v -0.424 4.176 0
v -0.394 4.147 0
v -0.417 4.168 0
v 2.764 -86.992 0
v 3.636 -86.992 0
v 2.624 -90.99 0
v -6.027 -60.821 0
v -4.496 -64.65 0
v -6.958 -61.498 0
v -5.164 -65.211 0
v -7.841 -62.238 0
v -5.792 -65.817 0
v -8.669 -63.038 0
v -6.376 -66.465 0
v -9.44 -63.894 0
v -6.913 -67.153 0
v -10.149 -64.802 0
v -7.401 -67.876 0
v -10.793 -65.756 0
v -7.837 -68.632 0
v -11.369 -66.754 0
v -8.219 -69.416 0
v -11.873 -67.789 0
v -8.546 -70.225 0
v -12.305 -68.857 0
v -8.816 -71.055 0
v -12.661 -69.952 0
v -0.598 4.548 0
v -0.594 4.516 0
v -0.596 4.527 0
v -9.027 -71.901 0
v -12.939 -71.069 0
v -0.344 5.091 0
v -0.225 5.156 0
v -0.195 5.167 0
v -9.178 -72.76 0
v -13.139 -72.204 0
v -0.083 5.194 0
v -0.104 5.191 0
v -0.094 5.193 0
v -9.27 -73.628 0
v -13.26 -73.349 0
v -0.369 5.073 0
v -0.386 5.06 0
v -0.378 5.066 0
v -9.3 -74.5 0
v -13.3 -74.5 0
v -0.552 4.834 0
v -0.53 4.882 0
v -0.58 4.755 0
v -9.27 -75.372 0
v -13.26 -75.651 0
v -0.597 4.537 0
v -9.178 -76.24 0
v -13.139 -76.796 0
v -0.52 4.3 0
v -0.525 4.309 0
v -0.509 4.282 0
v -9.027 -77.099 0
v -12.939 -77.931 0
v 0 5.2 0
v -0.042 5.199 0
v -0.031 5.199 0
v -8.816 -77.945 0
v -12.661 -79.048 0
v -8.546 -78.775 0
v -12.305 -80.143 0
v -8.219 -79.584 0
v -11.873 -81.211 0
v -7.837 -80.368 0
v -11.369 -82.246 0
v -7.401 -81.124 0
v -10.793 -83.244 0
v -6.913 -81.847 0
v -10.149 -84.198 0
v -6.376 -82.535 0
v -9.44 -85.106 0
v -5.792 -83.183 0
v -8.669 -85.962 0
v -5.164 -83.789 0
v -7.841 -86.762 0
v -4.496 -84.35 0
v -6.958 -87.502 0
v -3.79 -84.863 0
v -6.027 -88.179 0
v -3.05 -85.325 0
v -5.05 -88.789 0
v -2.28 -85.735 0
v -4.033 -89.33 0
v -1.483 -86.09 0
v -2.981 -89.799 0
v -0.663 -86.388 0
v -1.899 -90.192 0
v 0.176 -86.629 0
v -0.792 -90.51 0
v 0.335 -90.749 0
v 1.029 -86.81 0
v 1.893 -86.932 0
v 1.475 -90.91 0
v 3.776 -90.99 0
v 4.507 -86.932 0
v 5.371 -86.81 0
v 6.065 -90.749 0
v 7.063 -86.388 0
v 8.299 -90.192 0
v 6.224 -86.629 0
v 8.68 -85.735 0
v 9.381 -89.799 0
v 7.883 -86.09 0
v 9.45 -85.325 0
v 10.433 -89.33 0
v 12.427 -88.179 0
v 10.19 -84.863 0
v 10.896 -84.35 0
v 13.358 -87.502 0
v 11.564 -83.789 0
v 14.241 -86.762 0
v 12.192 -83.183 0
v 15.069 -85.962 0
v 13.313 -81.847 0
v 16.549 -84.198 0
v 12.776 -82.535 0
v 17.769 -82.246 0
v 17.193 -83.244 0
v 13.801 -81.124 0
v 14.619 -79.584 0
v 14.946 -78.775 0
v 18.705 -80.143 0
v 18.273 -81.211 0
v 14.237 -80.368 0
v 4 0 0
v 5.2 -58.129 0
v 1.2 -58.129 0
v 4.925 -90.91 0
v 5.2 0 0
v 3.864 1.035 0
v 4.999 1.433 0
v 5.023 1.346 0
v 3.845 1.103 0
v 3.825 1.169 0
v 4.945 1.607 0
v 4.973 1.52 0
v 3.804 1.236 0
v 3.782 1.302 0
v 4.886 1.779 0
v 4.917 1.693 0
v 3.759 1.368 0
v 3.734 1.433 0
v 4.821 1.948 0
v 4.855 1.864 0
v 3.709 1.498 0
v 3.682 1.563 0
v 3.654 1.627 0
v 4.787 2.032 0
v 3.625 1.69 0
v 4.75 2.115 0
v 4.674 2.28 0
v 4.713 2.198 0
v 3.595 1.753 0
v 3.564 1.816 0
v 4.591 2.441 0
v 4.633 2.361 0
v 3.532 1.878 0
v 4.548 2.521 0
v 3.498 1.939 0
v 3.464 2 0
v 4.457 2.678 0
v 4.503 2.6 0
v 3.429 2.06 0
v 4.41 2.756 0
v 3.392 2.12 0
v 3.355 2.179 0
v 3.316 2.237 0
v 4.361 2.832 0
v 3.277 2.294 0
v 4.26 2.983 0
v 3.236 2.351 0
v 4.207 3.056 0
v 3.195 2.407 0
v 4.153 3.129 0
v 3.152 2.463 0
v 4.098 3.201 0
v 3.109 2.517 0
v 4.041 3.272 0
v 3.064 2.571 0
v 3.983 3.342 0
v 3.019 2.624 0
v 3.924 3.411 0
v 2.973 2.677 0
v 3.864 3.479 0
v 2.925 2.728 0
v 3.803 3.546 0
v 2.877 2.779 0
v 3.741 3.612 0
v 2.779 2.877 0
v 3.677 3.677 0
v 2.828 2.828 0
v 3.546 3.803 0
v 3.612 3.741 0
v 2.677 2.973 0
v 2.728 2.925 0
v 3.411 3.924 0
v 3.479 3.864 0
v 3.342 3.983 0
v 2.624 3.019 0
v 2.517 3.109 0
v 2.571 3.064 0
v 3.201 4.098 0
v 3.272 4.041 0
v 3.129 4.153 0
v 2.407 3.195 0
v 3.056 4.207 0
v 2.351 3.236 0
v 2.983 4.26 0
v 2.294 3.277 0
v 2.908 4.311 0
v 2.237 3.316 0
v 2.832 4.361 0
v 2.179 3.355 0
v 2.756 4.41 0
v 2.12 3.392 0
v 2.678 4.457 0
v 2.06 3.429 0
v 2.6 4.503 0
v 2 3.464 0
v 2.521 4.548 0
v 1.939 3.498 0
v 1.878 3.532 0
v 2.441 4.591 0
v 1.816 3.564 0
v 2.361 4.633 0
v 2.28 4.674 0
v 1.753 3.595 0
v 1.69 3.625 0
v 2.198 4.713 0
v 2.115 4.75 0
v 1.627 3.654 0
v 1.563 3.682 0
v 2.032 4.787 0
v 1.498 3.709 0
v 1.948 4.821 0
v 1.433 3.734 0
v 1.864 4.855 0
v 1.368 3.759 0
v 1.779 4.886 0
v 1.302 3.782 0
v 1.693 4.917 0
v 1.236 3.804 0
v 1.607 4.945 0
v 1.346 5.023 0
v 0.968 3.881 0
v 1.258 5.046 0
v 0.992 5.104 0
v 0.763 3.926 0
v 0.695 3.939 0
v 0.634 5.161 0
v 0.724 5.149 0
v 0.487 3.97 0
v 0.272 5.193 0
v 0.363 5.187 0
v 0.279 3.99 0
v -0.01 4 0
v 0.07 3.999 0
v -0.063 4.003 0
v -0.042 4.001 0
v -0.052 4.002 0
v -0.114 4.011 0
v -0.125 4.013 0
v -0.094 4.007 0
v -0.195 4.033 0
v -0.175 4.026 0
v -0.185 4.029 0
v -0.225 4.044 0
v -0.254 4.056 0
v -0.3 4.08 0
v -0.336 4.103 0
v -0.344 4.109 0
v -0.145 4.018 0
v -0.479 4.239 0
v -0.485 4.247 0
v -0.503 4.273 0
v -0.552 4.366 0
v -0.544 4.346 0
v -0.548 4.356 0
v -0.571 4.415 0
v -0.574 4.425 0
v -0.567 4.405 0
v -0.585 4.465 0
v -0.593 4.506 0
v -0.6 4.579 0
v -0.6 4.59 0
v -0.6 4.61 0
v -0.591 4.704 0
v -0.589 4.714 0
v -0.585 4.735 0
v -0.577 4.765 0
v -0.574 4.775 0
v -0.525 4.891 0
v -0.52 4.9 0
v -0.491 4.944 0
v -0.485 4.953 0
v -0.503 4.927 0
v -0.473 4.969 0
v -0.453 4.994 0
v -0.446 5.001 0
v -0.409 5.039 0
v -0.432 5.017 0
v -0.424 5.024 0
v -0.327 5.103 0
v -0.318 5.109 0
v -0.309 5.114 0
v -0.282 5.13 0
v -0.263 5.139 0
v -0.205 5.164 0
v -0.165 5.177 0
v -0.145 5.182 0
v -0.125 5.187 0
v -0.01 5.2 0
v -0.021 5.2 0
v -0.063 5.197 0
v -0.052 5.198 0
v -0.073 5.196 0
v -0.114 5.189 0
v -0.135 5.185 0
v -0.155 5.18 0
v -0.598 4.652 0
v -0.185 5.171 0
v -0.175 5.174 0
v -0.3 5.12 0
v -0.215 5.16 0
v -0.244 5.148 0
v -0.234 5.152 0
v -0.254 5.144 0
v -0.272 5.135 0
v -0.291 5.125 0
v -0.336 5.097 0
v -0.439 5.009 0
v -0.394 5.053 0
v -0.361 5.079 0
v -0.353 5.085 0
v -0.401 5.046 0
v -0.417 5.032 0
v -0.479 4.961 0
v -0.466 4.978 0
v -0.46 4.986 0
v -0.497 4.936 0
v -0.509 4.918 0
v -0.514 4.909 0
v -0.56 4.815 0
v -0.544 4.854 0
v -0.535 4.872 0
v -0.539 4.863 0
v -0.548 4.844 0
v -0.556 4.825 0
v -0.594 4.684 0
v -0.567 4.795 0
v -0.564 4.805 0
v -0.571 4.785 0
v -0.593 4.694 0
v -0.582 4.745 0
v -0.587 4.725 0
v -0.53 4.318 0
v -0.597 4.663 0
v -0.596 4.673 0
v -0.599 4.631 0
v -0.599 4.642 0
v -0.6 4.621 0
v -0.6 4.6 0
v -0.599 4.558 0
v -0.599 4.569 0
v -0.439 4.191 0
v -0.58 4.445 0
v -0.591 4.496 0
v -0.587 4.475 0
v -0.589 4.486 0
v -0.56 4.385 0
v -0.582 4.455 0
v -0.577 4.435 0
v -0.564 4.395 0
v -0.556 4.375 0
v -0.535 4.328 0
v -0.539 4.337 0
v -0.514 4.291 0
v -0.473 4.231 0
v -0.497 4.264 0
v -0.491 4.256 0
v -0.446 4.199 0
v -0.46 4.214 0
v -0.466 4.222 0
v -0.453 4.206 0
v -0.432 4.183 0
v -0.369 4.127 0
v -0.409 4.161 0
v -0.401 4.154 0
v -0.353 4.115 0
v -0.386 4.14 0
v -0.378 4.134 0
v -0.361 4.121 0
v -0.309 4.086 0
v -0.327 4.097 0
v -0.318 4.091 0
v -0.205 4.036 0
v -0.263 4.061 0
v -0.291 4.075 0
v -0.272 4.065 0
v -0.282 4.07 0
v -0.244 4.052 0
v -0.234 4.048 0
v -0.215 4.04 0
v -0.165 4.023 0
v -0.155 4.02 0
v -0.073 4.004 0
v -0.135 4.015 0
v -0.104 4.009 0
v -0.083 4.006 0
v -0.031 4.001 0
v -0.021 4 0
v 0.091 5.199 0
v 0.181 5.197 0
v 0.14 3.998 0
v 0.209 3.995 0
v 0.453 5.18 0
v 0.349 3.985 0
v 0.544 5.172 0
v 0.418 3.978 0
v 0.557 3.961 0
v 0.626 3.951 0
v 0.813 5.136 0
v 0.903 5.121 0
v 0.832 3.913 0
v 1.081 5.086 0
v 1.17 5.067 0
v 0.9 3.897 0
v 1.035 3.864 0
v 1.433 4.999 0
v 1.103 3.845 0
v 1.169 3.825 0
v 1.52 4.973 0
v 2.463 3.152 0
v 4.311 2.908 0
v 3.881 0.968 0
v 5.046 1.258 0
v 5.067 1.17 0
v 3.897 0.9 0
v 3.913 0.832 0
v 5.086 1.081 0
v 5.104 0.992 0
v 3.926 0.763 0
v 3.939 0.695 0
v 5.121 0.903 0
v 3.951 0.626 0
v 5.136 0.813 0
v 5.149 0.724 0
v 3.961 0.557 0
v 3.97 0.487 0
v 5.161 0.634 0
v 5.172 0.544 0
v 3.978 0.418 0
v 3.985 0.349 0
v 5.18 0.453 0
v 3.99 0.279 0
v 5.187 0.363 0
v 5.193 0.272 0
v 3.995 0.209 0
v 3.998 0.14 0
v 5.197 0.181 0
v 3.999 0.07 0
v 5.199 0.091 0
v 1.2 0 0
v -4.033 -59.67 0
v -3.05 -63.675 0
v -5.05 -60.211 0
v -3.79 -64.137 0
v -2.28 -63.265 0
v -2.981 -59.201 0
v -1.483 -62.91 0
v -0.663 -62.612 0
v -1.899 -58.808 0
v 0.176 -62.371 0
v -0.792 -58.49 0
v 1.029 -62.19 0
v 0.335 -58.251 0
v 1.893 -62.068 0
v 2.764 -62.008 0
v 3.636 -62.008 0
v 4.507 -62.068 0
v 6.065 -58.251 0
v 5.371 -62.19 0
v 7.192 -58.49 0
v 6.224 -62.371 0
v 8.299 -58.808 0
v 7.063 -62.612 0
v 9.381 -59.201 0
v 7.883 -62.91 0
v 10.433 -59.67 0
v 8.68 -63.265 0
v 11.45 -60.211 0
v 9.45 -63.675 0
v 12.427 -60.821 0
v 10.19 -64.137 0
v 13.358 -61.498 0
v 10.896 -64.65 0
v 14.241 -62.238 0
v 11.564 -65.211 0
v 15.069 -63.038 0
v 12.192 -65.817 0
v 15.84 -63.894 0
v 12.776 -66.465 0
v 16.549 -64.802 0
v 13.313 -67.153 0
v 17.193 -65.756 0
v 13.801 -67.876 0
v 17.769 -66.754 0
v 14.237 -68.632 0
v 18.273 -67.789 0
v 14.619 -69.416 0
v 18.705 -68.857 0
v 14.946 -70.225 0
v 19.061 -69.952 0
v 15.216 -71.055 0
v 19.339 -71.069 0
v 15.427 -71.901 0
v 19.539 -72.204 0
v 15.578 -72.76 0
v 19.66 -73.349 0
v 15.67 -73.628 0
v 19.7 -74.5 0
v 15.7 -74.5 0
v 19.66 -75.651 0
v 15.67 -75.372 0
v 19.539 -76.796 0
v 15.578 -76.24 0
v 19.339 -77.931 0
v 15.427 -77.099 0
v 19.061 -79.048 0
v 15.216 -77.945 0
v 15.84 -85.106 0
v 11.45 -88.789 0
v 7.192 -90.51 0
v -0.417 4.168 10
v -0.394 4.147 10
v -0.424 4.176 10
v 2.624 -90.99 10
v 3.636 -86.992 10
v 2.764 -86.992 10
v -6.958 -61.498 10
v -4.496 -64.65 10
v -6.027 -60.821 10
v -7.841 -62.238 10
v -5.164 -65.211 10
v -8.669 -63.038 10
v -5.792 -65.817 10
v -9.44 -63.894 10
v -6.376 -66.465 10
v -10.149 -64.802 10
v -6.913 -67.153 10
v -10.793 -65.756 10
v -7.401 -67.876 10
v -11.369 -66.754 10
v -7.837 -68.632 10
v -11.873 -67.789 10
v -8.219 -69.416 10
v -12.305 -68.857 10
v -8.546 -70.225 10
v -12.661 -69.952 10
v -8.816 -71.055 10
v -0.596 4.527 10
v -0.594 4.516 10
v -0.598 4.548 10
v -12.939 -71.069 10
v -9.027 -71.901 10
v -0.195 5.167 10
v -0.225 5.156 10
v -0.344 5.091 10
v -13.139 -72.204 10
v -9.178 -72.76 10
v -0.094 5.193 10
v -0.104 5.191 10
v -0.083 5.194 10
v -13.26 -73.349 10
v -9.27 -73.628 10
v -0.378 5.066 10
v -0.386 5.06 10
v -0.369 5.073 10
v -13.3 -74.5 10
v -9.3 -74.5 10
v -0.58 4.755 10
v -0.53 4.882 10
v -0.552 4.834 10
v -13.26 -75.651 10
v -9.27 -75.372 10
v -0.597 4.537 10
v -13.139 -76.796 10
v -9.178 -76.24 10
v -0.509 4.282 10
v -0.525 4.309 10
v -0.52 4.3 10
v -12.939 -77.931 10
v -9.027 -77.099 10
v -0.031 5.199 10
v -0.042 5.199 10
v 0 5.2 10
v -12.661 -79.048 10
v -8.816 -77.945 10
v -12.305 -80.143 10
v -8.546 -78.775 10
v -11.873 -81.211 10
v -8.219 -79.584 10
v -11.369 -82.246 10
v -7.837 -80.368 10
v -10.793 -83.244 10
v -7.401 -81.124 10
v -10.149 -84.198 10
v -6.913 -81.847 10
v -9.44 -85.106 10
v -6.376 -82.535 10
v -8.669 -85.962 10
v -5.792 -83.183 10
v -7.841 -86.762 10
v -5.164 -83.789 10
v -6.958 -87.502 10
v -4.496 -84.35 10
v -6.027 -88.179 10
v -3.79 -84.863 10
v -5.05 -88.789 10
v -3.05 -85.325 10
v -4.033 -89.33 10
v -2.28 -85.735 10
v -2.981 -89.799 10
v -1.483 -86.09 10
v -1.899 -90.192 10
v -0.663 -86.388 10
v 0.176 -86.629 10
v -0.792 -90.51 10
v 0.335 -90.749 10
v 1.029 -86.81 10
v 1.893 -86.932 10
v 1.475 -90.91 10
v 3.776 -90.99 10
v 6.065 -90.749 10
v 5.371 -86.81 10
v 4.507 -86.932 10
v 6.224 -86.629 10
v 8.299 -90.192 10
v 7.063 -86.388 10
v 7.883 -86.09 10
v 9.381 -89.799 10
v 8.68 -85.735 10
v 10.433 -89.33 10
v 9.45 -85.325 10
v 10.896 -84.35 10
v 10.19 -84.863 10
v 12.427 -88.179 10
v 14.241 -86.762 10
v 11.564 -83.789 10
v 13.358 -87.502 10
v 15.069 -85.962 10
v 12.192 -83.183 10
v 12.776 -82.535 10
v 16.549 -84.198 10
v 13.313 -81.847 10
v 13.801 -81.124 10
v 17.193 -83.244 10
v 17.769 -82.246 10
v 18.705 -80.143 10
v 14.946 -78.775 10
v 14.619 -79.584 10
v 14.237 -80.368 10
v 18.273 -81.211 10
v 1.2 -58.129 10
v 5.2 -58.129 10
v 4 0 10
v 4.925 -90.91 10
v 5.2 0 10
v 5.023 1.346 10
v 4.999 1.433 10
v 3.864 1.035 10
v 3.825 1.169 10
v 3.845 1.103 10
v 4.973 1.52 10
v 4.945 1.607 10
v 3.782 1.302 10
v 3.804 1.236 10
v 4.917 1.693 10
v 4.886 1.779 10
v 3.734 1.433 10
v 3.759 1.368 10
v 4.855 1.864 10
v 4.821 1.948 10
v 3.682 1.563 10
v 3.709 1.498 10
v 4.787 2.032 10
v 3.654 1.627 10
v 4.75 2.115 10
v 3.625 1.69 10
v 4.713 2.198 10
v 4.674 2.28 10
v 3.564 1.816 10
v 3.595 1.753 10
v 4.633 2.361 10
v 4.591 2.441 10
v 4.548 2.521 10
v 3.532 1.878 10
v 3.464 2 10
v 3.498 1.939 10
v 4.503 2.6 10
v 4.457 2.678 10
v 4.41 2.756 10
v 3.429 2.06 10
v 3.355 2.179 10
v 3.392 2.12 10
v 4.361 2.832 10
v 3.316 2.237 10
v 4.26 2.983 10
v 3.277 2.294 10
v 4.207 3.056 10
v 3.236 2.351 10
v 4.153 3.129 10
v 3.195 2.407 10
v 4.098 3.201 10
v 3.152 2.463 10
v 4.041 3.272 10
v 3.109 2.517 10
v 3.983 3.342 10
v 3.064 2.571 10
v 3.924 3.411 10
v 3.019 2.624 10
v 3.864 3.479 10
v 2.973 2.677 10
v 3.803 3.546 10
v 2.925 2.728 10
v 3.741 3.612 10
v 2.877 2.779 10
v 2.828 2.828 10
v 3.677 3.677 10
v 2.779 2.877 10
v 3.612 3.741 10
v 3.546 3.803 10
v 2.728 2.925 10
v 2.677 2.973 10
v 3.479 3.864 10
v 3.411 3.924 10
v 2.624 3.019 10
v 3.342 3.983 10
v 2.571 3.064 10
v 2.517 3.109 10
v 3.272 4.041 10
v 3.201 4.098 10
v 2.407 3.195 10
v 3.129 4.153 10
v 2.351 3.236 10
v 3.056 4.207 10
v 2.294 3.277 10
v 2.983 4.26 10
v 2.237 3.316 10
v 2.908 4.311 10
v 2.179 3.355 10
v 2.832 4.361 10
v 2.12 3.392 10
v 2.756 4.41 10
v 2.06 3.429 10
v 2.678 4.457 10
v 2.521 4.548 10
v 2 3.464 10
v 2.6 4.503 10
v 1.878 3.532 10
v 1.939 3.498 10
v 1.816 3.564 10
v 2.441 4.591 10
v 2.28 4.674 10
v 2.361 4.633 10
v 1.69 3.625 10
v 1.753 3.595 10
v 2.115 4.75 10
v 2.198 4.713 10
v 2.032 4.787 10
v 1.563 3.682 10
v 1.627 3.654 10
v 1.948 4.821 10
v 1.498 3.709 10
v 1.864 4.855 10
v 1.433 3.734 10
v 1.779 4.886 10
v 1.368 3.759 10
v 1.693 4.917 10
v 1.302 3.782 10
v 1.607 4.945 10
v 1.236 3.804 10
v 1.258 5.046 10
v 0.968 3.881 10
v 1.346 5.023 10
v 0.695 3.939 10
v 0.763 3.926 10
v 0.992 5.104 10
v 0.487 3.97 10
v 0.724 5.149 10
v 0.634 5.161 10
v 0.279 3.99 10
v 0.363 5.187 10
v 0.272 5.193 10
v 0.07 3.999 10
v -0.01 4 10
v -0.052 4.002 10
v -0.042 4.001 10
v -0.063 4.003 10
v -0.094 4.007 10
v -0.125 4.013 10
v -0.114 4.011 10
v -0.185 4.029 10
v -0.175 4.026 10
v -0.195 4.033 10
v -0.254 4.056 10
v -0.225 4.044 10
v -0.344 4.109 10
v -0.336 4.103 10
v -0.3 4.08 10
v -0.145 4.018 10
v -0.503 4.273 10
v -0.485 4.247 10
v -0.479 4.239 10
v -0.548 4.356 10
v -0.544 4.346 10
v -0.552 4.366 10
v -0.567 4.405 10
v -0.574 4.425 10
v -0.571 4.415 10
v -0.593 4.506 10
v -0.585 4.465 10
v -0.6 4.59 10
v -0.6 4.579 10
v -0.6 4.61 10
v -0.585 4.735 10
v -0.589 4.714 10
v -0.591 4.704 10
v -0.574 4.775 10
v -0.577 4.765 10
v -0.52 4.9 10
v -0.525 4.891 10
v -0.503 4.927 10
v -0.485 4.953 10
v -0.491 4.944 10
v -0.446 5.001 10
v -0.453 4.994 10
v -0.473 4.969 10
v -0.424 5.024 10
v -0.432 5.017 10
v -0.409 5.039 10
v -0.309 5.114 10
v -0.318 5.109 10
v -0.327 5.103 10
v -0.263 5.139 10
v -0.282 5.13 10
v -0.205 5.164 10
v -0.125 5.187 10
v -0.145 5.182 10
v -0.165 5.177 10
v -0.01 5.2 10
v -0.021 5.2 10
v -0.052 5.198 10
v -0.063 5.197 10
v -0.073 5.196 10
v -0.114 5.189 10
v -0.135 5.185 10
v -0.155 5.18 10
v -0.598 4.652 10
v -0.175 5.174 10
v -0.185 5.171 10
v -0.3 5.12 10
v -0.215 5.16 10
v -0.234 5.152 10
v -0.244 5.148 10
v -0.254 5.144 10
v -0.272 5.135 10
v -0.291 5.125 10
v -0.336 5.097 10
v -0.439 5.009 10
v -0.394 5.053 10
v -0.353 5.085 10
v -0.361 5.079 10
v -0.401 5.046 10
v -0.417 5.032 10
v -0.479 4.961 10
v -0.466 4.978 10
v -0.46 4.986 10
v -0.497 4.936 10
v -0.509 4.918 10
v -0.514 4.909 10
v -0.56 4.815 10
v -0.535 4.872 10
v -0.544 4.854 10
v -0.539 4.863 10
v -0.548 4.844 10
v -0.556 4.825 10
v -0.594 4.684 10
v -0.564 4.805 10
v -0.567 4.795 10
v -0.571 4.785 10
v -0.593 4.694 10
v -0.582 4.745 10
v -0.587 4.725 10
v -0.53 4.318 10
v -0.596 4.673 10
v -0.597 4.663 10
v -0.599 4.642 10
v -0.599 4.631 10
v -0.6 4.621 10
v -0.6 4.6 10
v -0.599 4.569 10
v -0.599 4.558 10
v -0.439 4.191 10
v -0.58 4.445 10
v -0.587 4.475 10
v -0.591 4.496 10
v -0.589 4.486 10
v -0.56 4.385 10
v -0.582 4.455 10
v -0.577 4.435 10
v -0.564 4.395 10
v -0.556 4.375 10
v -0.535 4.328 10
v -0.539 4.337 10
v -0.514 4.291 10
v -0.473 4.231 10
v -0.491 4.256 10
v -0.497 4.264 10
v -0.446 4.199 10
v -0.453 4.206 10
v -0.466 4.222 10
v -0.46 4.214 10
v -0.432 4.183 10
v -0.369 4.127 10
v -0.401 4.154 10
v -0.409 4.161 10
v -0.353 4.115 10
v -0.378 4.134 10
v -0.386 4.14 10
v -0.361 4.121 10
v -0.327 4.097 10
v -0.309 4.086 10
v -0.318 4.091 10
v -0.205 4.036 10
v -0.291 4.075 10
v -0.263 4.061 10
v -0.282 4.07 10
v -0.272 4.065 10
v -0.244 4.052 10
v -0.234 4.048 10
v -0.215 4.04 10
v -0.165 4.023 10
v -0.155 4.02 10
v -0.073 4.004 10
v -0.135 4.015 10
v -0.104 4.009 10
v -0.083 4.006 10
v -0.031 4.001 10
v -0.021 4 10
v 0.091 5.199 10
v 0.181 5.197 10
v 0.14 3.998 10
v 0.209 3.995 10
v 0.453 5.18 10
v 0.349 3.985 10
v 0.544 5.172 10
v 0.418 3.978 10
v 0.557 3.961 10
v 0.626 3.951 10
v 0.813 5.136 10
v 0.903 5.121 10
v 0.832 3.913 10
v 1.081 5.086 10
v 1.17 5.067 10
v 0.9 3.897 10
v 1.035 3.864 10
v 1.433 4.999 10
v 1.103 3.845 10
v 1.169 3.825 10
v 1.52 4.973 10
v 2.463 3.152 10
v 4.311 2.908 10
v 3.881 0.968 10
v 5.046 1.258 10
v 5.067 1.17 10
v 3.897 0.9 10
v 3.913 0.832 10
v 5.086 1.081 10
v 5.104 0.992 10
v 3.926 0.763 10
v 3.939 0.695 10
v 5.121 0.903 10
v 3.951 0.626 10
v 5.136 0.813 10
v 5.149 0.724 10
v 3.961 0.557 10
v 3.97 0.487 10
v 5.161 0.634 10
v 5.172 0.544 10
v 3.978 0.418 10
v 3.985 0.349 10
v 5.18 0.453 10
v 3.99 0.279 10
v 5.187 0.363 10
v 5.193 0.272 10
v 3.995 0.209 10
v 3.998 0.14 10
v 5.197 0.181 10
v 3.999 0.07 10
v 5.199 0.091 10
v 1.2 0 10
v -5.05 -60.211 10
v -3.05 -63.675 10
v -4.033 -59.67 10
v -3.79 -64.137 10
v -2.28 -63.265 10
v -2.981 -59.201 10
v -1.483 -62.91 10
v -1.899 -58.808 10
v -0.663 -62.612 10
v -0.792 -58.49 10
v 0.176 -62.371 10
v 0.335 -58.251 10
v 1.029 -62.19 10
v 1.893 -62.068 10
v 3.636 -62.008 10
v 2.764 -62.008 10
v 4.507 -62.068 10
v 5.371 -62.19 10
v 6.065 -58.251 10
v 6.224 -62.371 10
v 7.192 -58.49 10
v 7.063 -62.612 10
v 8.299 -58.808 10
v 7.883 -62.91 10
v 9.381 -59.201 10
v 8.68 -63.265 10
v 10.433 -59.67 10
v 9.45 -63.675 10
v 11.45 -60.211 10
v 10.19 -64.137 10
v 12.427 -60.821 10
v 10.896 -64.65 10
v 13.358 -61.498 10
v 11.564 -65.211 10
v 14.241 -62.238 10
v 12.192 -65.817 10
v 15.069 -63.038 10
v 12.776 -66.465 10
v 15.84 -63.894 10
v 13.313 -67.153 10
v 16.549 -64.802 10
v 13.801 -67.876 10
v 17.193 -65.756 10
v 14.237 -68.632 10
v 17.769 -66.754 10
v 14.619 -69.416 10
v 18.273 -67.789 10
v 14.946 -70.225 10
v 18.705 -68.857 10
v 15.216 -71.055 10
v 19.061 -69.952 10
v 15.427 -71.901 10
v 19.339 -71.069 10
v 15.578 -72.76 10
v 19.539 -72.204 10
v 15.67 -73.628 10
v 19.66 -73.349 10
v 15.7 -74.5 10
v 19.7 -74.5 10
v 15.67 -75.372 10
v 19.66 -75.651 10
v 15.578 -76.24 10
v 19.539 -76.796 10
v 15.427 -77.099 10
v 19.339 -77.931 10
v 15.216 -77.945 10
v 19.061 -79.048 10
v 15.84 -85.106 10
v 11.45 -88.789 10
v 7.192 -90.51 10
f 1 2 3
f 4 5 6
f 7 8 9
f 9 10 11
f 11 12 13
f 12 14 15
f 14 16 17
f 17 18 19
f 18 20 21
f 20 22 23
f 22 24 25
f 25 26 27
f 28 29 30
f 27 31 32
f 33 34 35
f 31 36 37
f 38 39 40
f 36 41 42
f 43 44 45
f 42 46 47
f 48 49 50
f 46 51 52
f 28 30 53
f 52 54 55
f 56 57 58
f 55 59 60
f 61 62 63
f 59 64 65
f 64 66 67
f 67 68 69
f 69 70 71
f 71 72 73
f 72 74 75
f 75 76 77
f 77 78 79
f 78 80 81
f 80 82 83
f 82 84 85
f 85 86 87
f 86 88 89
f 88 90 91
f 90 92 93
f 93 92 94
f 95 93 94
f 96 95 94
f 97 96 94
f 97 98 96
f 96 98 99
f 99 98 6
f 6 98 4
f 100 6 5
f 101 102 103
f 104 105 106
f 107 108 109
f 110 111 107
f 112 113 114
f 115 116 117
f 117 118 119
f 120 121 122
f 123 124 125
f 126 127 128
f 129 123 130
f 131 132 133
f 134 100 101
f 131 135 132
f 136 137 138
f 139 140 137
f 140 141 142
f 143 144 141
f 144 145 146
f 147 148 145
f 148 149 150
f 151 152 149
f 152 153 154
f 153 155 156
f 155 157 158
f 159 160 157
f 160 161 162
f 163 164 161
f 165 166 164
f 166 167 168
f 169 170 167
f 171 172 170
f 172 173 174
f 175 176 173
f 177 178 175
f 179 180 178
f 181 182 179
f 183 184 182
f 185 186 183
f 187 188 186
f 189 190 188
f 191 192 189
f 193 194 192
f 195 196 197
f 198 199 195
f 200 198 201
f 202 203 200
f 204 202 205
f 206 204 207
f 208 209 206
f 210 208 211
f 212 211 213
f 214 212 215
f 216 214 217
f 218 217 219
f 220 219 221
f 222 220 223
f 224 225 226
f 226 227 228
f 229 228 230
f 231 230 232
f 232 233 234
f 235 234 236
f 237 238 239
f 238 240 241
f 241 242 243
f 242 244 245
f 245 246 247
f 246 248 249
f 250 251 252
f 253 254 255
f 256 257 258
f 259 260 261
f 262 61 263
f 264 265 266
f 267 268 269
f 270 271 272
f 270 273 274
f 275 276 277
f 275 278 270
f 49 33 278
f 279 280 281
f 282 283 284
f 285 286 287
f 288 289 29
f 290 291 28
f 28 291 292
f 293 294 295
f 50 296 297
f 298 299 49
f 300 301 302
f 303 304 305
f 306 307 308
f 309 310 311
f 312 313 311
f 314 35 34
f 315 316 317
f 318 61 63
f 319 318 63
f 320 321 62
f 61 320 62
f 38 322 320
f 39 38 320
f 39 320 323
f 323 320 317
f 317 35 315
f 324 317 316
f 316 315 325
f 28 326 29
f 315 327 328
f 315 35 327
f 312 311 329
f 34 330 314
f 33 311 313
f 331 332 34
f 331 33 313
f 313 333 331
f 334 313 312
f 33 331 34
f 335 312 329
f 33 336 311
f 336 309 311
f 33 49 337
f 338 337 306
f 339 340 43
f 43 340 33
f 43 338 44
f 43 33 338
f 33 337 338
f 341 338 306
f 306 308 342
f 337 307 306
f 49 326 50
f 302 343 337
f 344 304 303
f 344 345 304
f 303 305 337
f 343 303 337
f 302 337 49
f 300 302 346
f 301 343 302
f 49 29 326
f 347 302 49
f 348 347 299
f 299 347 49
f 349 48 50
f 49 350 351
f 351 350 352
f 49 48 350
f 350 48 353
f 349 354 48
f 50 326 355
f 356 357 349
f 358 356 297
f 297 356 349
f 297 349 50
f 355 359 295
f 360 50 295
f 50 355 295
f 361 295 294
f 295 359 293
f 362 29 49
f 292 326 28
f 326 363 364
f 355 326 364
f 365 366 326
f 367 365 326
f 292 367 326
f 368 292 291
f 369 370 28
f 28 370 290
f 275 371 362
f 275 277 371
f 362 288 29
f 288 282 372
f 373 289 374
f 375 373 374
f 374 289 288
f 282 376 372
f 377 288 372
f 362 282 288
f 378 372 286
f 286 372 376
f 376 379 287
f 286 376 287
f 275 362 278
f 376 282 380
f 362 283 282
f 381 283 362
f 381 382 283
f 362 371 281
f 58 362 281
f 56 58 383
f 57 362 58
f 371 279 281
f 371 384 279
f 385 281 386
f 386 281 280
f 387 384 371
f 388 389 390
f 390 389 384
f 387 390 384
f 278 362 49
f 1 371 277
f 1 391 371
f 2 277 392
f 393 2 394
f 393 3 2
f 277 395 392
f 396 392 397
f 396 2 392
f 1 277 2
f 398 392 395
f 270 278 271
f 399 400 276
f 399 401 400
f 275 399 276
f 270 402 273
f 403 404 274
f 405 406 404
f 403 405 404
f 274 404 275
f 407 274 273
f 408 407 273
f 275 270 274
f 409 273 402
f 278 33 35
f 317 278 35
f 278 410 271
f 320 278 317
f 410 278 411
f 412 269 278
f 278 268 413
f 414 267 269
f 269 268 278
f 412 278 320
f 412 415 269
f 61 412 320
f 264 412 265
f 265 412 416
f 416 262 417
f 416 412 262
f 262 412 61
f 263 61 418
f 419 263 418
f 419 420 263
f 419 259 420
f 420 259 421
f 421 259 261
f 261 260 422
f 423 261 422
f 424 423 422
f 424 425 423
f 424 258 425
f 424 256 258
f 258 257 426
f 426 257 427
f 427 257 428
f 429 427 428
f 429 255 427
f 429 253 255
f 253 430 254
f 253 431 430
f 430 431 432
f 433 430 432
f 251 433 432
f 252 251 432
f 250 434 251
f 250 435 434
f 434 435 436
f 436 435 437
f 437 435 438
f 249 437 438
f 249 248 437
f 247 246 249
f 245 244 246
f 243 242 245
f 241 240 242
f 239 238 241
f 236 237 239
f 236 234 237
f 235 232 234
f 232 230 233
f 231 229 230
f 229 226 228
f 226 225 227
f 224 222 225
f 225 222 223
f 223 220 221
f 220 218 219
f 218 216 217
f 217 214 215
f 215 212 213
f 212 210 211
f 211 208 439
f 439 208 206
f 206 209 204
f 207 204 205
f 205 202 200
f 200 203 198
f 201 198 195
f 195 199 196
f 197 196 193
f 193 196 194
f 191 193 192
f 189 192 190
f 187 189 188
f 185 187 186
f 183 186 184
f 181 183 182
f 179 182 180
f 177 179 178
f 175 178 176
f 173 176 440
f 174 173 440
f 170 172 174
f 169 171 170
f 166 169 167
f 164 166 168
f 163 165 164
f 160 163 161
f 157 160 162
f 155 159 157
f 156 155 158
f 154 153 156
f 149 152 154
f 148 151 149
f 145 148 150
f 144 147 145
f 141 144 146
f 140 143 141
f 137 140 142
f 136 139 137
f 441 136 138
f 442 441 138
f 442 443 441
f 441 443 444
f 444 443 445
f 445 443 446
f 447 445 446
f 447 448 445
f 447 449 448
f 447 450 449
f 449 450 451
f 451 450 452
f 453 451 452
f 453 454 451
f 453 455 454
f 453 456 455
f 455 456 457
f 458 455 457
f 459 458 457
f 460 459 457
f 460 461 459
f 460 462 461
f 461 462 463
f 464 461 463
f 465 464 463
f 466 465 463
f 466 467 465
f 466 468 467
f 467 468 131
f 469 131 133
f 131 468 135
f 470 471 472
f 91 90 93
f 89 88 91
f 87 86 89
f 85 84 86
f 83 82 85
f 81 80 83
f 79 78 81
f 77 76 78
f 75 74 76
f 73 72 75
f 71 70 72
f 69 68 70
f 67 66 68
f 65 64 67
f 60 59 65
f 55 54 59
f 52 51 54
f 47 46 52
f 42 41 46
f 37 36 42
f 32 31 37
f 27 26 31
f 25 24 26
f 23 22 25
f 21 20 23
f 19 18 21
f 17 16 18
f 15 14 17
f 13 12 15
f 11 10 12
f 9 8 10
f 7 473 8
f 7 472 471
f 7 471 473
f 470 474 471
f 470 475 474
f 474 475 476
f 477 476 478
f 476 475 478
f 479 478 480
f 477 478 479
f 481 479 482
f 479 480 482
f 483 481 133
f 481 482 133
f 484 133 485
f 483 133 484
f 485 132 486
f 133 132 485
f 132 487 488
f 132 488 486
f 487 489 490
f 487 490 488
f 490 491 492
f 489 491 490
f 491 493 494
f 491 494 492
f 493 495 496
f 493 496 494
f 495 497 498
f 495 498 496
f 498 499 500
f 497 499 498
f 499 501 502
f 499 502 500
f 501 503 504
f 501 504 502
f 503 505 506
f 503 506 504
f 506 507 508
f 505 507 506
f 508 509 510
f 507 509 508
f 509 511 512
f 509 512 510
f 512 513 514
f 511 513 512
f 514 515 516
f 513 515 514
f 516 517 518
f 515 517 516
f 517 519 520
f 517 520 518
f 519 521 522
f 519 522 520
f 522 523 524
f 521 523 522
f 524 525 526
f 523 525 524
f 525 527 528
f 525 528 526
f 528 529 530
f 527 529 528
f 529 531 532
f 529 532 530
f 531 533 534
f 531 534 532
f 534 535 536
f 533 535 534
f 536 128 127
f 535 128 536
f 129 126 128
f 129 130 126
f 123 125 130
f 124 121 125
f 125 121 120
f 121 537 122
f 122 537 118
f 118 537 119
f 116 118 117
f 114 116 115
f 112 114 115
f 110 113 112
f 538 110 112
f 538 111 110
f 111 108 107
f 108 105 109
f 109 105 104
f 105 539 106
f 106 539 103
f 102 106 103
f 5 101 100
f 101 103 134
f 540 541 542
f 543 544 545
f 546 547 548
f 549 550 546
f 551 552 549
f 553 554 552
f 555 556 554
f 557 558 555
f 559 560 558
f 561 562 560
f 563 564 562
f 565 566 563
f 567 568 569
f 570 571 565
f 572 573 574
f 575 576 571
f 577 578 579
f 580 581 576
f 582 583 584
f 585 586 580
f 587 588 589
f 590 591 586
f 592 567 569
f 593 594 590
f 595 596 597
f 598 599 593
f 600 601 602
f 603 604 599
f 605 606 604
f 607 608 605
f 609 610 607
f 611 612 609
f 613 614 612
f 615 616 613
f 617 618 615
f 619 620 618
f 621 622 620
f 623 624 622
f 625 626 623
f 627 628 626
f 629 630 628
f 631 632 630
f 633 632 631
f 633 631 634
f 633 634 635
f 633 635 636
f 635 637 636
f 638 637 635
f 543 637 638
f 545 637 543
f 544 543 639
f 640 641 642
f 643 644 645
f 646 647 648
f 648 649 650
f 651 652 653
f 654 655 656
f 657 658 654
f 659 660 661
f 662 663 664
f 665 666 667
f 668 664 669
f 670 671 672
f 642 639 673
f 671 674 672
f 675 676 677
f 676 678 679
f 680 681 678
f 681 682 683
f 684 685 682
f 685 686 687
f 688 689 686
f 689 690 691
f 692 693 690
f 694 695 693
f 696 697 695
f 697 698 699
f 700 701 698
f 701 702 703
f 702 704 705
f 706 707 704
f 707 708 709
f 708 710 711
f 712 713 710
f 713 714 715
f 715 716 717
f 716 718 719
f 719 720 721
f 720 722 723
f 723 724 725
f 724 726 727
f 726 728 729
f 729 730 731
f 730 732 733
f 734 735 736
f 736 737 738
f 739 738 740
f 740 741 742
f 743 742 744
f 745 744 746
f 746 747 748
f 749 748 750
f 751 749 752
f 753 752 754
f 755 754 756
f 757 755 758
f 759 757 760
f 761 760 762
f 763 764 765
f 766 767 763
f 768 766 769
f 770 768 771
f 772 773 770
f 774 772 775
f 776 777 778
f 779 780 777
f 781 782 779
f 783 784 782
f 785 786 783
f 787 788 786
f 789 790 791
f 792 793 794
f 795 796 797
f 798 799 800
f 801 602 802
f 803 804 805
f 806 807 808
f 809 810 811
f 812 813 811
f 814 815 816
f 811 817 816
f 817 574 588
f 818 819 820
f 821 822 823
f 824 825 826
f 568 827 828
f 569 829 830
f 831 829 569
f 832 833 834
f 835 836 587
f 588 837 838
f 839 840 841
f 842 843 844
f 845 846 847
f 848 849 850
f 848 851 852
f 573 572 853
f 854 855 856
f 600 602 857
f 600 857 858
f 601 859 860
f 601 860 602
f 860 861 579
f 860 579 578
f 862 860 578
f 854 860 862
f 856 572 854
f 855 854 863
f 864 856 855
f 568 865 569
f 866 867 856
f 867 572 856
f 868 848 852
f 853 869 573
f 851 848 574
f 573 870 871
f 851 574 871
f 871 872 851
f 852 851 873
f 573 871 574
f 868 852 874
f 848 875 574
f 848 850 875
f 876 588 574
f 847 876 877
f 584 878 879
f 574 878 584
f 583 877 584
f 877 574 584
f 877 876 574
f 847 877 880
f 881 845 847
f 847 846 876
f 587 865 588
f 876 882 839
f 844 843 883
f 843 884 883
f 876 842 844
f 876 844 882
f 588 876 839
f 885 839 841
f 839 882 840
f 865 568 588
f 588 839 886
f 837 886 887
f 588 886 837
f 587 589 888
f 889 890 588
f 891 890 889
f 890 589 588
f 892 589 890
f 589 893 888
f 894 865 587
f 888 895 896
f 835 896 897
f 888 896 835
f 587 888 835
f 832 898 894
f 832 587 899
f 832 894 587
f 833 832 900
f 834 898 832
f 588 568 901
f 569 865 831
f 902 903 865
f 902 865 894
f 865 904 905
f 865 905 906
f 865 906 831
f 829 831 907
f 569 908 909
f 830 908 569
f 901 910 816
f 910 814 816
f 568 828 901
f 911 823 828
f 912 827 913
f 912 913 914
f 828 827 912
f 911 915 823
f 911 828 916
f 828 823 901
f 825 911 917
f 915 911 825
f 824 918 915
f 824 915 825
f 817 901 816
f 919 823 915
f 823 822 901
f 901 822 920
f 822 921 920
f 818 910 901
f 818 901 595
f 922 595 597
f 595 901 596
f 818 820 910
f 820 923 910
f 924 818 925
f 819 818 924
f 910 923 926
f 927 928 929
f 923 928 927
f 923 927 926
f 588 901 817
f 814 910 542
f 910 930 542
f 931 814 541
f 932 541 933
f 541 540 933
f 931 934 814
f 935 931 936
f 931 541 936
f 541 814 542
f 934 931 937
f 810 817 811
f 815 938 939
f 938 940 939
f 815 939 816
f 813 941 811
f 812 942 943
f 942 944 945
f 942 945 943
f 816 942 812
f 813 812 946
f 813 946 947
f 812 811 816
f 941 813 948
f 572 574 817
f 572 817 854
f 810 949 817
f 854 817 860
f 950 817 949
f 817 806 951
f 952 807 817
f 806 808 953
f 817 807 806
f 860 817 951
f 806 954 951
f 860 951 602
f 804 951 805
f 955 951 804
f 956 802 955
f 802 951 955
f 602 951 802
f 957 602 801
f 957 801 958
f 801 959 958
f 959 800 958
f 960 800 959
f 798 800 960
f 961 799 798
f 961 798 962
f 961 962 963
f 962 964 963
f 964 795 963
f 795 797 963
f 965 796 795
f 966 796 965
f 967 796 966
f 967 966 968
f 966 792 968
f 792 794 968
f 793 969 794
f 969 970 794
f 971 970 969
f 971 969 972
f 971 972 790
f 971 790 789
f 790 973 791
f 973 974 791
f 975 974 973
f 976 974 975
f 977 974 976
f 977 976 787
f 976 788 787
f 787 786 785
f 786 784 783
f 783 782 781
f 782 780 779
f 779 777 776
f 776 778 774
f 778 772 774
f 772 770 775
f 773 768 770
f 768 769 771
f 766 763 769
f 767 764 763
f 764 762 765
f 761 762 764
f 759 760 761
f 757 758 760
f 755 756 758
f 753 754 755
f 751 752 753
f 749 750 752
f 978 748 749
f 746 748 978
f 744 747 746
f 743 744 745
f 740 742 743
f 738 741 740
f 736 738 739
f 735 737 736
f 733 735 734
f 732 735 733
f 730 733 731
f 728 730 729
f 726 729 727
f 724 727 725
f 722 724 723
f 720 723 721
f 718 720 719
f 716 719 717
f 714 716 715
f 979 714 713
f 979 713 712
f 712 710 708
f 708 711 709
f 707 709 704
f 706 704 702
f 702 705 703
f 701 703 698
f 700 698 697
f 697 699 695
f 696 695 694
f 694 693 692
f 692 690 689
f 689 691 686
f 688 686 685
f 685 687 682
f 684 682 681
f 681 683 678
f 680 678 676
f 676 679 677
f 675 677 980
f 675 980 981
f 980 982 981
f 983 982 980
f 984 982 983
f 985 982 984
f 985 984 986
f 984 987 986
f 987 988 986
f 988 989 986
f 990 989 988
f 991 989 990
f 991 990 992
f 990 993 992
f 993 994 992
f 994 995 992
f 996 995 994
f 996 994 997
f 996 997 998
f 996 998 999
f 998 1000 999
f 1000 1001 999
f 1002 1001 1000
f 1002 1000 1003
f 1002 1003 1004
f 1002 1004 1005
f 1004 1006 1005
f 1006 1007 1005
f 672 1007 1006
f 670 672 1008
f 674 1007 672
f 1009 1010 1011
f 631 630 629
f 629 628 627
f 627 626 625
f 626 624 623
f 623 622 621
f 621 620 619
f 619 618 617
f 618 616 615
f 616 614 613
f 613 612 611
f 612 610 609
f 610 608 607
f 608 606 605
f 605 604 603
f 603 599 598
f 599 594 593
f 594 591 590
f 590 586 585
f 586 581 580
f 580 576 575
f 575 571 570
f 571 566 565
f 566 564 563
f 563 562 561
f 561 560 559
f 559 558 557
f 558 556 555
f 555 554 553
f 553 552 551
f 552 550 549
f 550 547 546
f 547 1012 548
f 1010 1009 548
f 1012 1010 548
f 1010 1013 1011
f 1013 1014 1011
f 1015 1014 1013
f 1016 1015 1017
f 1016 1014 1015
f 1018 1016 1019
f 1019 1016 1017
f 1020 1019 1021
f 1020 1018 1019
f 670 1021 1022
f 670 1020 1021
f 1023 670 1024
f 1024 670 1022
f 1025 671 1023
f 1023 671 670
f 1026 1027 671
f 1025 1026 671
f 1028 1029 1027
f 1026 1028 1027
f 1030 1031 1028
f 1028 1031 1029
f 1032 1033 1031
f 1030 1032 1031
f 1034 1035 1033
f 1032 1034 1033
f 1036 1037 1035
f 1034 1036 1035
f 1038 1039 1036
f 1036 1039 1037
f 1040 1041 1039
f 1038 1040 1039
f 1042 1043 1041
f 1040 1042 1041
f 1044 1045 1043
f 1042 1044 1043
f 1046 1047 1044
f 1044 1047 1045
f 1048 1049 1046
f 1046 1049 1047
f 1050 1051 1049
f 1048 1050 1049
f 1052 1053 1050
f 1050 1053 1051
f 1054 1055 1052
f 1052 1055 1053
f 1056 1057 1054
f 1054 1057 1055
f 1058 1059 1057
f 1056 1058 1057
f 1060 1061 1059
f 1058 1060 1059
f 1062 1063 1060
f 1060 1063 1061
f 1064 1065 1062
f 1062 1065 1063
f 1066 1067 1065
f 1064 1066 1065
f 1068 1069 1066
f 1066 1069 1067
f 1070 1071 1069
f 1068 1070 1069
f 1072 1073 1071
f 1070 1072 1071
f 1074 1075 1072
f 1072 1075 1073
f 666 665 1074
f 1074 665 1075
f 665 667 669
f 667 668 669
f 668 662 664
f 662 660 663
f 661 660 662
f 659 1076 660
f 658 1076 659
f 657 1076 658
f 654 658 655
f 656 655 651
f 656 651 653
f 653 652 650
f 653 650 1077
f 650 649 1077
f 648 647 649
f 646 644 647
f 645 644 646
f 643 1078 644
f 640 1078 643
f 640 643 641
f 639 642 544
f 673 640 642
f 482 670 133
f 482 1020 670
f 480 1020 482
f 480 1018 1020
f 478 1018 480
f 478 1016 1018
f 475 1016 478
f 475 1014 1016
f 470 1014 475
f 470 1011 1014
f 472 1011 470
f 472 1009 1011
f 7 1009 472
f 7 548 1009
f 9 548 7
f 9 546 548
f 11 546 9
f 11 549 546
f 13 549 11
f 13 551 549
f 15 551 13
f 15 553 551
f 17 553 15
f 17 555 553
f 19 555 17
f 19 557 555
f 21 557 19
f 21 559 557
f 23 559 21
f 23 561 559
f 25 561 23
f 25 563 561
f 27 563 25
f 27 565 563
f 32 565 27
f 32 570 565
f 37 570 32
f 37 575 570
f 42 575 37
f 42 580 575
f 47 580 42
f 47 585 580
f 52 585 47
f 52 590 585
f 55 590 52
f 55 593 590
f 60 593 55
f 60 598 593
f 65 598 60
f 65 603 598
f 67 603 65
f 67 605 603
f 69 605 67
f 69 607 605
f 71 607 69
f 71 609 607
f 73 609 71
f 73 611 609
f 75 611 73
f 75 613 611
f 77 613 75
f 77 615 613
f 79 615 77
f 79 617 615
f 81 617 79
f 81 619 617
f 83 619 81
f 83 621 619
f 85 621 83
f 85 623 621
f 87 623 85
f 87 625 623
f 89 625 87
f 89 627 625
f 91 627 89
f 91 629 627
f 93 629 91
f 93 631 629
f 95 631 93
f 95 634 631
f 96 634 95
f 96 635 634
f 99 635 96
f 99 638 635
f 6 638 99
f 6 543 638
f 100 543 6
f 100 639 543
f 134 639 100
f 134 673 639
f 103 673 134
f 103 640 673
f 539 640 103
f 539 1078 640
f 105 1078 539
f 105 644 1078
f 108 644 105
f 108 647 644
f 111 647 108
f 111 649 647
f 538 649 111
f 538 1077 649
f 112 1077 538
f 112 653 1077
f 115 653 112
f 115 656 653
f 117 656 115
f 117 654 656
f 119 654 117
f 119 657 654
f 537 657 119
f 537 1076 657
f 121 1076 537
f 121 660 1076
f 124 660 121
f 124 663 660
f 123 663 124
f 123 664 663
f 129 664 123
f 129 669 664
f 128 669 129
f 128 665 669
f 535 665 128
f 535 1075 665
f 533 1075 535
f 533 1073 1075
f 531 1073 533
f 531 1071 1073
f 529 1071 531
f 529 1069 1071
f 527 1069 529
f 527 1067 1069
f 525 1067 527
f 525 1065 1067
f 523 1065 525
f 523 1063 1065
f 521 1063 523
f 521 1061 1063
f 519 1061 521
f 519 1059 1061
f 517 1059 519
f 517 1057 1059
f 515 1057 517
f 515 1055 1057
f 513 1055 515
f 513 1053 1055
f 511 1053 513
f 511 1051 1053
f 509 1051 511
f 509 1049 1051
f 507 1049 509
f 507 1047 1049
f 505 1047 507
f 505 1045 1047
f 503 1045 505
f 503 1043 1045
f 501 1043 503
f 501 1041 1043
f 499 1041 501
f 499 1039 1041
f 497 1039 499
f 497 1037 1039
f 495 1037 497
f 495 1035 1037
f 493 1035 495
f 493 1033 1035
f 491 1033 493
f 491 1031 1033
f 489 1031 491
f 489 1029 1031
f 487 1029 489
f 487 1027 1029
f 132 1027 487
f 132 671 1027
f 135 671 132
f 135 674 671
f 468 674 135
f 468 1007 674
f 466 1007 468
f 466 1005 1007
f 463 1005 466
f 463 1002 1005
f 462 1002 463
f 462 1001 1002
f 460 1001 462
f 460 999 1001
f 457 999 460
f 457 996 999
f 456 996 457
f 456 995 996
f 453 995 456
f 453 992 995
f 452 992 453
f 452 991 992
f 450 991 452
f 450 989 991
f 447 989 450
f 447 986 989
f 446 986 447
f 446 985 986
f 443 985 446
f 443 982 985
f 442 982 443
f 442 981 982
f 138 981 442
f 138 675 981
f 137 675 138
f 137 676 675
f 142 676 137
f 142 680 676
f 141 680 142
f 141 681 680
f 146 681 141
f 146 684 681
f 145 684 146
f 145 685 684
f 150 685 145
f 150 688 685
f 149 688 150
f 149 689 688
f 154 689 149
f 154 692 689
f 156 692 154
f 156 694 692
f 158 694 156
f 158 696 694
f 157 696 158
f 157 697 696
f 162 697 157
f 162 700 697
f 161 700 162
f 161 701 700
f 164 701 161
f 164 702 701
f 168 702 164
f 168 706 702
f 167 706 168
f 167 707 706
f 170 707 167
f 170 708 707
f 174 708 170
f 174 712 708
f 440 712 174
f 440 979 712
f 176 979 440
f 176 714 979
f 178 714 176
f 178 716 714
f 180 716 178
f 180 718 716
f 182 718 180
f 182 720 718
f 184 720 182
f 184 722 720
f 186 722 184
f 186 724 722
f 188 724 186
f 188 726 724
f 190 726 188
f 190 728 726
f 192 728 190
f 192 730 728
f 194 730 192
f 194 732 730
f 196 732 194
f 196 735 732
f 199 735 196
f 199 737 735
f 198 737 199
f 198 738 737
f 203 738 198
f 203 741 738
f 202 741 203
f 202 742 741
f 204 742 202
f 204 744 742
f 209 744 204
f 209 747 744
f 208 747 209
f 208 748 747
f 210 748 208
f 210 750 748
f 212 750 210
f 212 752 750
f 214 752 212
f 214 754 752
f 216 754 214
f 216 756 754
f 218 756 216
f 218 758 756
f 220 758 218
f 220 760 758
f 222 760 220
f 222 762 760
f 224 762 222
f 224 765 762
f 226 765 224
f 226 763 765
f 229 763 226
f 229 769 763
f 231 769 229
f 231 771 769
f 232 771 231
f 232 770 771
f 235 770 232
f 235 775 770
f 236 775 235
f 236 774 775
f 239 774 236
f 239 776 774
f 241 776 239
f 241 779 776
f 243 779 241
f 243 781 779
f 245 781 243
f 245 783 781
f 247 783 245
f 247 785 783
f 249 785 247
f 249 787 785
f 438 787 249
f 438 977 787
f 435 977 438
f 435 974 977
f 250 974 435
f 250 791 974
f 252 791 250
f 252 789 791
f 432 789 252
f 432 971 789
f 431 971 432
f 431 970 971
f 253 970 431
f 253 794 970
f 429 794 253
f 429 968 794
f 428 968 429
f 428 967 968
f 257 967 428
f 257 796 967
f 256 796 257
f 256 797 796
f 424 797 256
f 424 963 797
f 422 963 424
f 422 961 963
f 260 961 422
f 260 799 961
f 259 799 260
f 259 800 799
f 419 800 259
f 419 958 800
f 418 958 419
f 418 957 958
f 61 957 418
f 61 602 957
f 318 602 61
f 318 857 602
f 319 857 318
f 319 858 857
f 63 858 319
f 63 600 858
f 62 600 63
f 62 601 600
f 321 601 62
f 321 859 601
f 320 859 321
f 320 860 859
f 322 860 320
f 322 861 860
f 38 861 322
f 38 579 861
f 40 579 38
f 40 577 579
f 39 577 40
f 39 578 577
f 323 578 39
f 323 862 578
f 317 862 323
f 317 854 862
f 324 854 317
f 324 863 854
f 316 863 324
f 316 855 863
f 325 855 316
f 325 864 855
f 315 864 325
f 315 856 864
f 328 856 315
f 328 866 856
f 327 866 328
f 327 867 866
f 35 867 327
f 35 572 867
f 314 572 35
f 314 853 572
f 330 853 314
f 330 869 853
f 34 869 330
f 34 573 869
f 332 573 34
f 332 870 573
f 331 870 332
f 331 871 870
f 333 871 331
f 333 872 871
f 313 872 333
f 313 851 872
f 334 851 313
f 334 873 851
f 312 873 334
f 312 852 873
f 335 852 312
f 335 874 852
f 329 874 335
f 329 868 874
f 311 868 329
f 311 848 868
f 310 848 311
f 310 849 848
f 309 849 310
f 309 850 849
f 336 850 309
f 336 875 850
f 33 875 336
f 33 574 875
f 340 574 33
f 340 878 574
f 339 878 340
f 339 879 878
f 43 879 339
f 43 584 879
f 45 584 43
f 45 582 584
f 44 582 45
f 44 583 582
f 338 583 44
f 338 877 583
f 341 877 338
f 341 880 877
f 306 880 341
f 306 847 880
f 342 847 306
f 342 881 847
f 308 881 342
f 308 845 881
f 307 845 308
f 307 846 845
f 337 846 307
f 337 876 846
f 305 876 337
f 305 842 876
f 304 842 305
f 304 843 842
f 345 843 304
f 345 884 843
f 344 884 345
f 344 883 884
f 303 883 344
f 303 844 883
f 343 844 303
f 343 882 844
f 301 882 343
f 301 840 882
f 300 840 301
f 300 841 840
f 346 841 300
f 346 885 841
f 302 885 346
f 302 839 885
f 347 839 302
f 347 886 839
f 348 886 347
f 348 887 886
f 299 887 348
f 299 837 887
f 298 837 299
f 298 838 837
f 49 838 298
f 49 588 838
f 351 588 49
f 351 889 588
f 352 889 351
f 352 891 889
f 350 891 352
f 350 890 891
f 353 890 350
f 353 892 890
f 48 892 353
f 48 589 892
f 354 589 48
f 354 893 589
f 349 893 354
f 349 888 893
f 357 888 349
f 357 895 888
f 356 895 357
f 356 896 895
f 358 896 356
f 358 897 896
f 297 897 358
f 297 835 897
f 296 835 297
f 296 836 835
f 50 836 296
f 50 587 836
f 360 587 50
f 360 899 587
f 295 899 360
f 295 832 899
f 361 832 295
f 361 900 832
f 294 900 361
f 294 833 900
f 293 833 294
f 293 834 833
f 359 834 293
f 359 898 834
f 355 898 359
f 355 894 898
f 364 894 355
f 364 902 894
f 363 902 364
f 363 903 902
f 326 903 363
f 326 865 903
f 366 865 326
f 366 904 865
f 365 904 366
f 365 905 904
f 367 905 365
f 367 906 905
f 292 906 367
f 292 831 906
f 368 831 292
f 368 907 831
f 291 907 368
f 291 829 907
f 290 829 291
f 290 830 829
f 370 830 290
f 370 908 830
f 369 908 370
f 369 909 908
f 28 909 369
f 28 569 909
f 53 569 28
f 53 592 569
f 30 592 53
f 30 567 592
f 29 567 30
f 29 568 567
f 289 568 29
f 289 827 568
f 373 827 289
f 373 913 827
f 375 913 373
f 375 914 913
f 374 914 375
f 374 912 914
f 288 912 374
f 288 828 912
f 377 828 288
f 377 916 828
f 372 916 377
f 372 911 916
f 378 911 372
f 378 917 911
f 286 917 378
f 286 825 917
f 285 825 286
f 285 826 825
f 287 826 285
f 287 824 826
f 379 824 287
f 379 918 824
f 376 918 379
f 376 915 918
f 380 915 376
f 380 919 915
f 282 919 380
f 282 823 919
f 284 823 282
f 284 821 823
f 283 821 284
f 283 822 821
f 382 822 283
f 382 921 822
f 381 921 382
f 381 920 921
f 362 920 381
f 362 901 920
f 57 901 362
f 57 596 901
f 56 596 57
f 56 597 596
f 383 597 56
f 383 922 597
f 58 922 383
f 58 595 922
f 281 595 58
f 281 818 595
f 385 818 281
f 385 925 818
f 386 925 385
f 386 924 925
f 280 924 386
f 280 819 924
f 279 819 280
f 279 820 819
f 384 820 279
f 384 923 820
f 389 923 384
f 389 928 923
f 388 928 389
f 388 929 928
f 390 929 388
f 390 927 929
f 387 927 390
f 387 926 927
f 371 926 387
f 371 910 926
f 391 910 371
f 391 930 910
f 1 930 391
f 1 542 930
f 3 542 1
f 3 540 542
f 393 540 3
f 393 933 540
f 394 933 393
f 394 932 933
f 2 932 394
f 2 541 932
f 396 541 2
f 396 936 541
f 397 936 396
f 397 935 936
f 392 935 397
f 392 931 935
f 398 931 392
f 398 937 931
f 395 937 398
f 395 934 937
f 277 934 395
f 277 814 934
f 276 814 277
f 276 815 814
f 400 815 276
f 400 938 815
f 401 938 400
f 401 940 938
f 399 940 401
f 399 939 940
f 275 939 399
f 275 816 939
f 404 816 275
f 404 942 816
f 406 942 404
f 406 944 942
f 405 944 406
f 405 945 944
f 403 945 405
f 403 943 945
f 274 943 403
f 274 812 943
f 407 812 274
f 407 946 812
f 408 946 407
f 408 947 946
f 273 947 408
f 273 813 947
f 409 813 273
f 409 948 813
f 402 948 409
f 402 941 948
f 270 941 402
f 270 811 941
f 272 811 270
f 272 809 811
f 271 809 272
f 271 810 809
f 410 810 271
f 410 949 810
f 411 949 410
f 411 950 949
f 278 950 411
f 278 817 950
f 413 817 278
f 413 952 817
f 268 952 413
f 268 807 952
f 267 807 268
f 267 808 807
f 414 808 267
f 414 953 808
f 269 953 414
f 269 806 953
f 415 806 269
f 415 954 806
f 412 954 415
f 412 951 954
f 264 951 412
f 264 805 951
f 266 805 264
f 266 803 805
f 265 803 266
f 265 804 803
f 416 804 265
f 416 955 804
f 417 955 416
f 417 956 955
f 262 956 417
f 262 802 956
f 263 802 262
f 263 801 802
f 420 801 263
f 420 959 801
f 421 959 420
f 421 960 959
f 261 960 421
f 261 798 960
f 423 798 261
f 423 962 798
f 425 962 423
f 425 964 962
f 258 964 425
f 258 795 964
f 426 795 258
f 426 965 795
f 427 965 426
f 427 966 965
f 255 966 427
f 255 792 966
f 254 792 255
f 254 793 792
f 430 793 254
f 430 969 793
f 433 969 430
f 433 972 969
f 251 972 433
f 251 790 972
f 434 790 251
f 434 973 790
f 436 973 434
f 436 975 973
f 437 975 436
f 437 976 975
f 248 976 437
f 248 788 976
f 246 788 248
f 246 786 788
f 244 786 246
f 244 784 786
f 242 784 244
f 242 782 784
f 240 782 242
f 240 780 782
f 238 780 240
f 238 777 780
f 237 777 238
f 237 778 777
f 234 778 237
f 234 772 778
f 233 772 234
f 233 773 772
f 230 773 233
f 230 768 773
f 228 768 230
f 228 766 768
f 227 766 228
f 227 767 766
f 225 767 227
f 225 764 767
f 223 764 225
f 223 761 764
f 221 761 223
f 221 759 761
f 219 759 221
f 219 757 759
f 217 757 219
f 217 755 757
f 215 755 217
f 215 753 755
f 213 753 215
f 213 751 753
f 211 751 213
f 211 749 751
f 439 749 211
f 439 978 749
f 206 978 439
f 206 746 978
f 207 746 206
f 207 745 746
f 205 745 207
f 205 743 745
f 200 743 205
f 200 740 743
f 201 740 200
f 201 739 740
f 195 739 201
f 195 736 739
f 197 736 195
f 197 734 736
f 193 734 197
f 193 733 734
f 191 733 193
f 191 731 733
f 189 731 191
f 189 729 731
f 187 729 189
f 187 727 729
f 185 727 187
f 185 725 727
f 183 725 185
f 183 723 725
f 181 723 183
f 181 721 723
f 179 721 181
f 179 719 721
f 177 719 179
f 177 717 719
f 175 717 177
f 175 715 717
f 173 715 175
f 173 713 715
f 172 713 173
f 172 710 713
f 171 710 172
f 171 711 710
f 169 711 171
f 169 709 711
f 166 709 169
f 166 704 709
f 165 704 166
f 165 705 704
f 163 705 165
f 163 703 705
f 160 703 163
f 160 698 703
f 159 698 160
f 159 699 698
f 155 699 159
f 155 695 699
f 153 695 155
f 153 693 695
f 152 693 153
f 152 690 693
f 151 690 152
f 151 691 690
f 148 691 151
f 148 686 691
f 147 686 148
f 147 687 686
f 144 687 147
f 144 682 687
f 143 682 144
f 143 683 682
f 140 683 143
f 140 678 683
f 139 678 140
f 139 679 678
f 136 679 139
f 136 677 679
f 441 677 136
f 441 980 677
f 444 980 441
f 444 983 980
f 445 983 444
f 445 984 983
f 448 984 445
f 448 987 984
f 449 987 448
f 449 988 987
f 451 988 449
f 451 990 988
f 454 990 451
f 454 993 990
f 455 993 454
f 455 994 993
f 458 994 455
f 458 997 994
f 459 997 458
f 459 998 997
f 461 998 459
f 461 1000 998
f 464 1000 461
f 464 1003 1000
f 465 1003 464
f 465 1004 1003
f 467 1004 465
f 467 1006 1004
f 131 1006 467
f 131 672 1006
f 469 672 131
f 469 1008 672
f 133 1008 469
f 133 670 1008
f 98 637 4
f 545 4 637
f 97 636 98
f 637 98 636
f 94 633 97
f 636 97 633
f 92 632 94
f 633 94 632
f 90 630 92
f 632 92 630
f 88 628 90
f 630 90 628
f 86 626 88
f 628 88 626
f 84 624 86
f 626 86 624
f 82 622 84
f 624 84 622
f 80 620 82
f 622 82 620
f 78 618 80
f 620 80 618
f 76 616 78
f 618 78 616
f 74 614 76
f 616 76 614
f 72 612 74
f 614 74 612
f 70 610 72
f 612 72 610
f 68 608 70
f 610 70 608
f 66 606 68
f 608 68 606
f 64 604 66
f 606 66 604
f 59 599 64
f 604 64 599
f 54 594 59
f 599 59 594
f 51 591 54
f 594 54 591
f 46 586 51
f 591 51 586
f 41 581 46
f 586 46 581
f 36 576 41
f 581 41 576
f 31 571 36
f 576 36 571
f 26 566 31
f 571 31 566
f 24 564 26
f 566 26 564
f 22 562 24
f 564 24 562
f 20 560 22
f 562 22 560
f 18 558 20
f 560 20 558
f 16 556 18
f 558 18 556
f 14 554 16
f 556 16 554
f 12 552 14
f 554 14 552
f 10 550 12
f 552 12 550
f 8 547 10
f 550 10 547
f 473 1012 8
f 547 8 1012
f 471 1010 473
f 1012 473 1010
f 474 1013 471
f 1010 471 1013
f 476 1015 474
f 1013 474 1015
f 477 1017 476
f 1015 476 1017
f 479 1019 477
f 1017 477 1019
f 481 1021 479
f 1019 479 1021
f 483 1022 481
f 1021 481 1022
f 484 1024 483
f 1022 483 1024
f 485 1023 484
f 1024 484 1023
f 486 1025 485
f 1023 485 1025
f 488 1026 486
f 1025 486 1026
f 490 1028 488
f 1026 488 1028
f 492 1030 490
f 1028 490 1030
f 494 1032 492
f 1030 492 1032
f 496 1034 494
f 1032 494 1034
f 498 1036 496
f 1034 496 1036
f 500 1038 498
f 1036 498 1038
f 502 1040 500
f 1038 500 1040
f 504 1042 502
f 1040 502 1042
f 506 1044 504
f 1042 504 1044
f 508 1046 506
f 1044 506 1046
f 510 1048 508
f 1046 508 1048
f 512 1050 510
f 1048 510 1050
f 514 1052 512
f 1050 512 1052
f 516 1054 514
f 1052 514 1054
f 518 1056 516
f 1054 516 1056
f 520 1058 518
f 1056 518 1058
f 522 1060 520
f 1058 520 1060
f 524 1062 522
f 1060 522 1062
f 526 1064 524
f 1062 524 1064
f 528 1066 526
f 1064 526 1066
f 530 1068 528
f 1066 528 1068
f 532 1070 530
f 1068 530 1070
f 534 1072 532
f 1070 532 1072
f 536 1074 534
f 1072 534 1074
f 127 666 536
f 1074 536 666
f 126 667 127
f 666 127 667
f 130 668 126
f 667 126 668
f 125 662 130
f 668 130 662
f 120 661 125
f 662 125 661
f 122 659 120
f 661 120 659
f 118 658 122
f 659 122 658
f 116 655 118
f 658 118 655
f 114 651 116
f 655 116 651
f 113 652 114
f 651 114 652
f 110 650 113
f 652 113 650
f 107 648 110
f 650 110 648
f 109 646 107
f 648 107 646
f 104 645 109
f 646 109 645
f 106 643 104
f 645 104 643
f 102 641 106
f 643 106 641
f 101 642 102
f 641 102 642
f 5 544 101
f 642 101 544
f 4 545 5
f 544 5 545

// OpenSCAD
width= 10;
thinness=1.2;
mirror=4;
thickness=4;
ring=25;
length=60;
handle_length=50;
handle_width=width;
$fn=90;
linear_extrude(width) {
  p1=[for (a=[0:1:89]) mirror*[cos(a),sin(a)]];
  p2=[for (a=[270:-1:91]) [0,mirror+thinness/2]+0.5*thinness*[cos(a),sin(a)]];
  p3=[for (a=[90:-1:0]) (mirror+thinness)*[cos(a),sin(a)]];
  polygon([each p1, each p2, each p3]);
  translate([mirror+thinness-thickness,-length])square([thickness,length]);
  translate([mirror+thinness-thickness/2,-length-ring/2-thickness/2]) difference() {
    circle(d=ring+2*thickness);
    circle(d=ring);
  }
}
